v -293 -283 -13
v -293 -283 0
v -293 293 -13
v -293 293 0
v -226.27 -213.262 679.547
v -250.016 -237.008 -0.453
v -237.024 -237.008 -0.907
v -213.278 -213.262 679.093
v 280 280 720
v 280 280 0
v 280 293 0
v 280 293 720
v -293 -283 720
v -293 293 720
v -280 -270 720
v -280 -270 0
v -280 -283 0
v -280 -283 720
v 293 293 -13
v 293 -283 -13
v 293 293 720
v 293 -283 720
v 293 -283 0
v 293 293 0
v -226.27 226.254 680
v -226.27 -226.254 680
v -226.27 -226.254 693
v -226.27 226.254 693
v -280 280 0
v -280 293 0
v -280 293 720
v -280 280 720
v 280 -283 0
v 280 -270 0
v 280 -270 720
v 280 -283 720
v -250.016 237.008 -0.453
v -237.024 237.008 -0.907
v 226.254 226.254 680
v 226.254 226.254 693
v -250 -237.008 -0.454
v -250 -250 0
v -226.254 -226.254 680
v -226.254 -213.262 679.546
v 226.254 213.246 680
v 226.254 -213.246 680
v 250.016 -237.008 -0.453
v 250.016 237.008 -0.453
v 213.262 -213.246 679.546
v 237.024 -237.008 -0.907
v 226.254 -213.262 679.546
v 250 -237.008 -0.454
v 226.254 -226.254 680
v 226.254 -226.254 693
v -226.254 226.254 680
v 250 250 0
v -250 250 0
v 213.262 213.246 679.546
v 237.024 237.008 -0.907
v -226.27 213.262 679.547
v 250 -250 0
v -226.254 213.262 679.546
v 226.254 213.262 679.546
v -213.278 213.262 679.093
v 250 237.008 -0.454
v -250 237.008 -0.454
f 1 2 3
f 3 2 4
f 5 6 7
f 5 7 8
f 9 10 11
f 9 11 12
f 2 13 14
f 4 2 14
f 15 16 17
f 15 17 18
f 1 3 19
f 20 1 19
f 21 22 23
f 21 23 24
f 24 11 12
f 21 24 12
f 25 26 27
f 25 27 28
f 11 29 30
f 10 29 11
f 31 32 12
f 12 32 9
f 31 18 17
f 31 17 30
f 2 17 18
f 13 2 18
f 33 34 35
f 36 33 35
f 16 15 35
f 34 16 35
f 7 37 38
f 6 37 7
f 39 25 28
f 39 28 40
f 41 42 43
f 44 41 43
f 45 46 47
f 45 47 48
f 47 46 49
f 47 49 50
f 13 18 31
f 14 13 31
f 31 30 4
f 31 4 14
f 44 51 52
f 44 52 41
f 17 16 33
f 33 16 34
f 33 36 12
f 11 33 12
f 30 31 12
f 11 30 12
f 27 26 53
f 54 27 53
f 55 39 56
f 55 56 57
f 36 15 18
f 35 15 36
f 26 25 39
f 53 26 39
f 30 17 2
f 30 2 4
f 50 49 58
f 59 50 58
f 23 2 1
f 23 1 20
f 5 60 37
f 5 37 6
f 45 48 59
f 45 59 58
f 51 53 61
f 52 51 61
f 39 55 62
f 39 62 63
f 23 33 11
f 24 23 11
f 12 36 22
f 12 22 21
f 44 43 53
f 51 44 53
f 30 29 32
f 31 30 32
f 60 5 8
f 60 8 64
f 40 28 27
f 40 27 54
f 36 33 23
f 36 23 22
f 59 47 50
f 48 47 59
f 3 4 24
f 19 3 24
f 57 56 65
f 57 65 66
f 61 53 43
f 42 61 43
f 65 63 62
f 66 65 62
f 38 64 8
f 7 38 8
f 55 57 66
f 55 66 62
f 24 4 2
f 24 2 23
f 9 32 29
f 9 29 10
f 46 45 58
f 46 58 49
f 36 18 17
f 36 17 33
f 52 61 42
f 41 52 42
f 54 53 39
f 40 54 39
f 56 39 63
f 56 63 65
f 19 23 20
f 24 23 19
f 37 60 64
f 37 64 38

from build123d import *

# Parameters (mm, degrees)
F7_DEPTH  = 13
F9_DEPTH  = 13
F11_DEPTH = 13
F13_DEPTH = 13
F14_W     = 452.5235775191
F14_H     = 452.5077534912
F15_DEPTH = 13
F17_W     = 560
F17_H     = 720
F18_DEPTH = 13
F20_W     = 560
F20_H     = 720
F21_DEPTH = 13
F24_W     = 576
F24_H     = 720
F25_DEPTH = 13
F26_W     = 576
F26_H     = 720
F27_DEPTH = 13
F28_W     = 586
F28_H     = 576
F29_DEPTH = 13


with BuildPart() as f7:
    # F6 (on line) → F7 (new body)
    with BuildSketch(Plane(origin=(0, -249.6955062825, 8.719559218), x_dir=(-1, 0, 0), z_dir=(0, 0.999390827, -0.0348994967))):
        Polygon((-226.2538767456, 671.6896159476), (-250, -8.7248741756), (250, -8.7248741756), (226.2538767456, 671.6896159476), align=None)
    extrude(amount=F7_DEPTH)


with BuildPart() as f9:
    # F8 (on line) → F9 (new body)
    with BuildSketch(Plane(origin=(0, 249.6955062825, 8.719559218), x_dir=(-1, 0, 0), z_dir=(0, 0.999390827, 0.0348994967))):
        Polygon((-226.2538767456, 671.6896159476), (-250, -8.7248741756), (250, -8.7248741756), (226.2538767456, 671.6896159476), align=None)
    extrude(amount=-F9_DEPTH)


with BuildPart() as f11:
    # F10 (on line) → F11 (new body)
    with BuildSketch(Plane(origin=(-249.6955062825, 0, 8.719559218), x_dir=(0, -1, 0), z_dir=(-0.999390827, 0, 0.0348994967))):
        Polygon((-213.2617959944, 671.2361988682), (-237.0079192488, -9.178291255), (237.0079192488, -9.178291255), (213.2617959944, 671.2361988682), align=None)
    extrude(amount=-F11_DEPTH)


with BuildPart() as f13:
    # F12 (on line) → F13 (new body)
    with BuildSketch(Plane(origin=(249.6955062825, 0, 8.719559218), x_dir=(0, 1, 0), z_dir=(0.999390827, 0, 0.0348994967))):
        Polygon((-213.2459719665, 671.6896159476), (-237.0079192488, -9.178291255), (237.0079192488, -9.178291255), (213.2459719665, 671.6896159476), align=None)
    extrude(amount=-F13_DEPTH)


with BuildPart() as f15:
    # F14 (on offset) → F15 (new body)
    with BuildSketch(Plane.XY.offset(680)):
        with Locations((-0.0079120139, 0)):
            Rectangle(F14_W, F14_H)
    extrude(amount=F15_DEPTH)


with BuildPart() as f18:
    # F17 (on offset) → F18 (new body)
    with BuildSketch(Plane.XZ.offset(270)):
        with Locations((0, 360)):
            Rectangle(F17_W, F17_H)
    extrude(amount=F18_DEPTH)


with BuildPart() as f21:
    # F20 (on offset) → F21 (new body)
    with BuildSketch(Plane.XZ.offset(-280)):
        with Locations((0, 360)):
            Rectangle(F20_W, F20_H)
    extrude(amount=-F21_DEPTH)


with BuildPart() as f25:
    # F24 (on offset) → F25 (new body)
    with BuildSketch(Plane.YZ.offset(280)):
        with Locations((5, 360)):
            Rectangle(F24_W, F24_H)
    extrude(amount=F25_DEPTH)


with BuildPart() as f27:
    # F26 (on offset) → F27 (new body)
    with BuildSketch(Plane.YZ.offset(-280)):
        with Locations((5, 360)):
            Rectangle(F26_W, F26_H)
    extrude(amount=-F27_DEPTH)


with BuildPart() as f29:
    # F28 (on Top) → F29 (new body)
    with BuildSketch(Plane.XY):
        with Locations((0, 5)):
            Rectangle(F28_W, F28_H)
    extrude(amount=-F29_DEPTH)


solid = Compound([f7.part, f9.part, f11.part, f13.part, f15.part, f18.part, f21.part, f25.part, f27.part, f29.part])
